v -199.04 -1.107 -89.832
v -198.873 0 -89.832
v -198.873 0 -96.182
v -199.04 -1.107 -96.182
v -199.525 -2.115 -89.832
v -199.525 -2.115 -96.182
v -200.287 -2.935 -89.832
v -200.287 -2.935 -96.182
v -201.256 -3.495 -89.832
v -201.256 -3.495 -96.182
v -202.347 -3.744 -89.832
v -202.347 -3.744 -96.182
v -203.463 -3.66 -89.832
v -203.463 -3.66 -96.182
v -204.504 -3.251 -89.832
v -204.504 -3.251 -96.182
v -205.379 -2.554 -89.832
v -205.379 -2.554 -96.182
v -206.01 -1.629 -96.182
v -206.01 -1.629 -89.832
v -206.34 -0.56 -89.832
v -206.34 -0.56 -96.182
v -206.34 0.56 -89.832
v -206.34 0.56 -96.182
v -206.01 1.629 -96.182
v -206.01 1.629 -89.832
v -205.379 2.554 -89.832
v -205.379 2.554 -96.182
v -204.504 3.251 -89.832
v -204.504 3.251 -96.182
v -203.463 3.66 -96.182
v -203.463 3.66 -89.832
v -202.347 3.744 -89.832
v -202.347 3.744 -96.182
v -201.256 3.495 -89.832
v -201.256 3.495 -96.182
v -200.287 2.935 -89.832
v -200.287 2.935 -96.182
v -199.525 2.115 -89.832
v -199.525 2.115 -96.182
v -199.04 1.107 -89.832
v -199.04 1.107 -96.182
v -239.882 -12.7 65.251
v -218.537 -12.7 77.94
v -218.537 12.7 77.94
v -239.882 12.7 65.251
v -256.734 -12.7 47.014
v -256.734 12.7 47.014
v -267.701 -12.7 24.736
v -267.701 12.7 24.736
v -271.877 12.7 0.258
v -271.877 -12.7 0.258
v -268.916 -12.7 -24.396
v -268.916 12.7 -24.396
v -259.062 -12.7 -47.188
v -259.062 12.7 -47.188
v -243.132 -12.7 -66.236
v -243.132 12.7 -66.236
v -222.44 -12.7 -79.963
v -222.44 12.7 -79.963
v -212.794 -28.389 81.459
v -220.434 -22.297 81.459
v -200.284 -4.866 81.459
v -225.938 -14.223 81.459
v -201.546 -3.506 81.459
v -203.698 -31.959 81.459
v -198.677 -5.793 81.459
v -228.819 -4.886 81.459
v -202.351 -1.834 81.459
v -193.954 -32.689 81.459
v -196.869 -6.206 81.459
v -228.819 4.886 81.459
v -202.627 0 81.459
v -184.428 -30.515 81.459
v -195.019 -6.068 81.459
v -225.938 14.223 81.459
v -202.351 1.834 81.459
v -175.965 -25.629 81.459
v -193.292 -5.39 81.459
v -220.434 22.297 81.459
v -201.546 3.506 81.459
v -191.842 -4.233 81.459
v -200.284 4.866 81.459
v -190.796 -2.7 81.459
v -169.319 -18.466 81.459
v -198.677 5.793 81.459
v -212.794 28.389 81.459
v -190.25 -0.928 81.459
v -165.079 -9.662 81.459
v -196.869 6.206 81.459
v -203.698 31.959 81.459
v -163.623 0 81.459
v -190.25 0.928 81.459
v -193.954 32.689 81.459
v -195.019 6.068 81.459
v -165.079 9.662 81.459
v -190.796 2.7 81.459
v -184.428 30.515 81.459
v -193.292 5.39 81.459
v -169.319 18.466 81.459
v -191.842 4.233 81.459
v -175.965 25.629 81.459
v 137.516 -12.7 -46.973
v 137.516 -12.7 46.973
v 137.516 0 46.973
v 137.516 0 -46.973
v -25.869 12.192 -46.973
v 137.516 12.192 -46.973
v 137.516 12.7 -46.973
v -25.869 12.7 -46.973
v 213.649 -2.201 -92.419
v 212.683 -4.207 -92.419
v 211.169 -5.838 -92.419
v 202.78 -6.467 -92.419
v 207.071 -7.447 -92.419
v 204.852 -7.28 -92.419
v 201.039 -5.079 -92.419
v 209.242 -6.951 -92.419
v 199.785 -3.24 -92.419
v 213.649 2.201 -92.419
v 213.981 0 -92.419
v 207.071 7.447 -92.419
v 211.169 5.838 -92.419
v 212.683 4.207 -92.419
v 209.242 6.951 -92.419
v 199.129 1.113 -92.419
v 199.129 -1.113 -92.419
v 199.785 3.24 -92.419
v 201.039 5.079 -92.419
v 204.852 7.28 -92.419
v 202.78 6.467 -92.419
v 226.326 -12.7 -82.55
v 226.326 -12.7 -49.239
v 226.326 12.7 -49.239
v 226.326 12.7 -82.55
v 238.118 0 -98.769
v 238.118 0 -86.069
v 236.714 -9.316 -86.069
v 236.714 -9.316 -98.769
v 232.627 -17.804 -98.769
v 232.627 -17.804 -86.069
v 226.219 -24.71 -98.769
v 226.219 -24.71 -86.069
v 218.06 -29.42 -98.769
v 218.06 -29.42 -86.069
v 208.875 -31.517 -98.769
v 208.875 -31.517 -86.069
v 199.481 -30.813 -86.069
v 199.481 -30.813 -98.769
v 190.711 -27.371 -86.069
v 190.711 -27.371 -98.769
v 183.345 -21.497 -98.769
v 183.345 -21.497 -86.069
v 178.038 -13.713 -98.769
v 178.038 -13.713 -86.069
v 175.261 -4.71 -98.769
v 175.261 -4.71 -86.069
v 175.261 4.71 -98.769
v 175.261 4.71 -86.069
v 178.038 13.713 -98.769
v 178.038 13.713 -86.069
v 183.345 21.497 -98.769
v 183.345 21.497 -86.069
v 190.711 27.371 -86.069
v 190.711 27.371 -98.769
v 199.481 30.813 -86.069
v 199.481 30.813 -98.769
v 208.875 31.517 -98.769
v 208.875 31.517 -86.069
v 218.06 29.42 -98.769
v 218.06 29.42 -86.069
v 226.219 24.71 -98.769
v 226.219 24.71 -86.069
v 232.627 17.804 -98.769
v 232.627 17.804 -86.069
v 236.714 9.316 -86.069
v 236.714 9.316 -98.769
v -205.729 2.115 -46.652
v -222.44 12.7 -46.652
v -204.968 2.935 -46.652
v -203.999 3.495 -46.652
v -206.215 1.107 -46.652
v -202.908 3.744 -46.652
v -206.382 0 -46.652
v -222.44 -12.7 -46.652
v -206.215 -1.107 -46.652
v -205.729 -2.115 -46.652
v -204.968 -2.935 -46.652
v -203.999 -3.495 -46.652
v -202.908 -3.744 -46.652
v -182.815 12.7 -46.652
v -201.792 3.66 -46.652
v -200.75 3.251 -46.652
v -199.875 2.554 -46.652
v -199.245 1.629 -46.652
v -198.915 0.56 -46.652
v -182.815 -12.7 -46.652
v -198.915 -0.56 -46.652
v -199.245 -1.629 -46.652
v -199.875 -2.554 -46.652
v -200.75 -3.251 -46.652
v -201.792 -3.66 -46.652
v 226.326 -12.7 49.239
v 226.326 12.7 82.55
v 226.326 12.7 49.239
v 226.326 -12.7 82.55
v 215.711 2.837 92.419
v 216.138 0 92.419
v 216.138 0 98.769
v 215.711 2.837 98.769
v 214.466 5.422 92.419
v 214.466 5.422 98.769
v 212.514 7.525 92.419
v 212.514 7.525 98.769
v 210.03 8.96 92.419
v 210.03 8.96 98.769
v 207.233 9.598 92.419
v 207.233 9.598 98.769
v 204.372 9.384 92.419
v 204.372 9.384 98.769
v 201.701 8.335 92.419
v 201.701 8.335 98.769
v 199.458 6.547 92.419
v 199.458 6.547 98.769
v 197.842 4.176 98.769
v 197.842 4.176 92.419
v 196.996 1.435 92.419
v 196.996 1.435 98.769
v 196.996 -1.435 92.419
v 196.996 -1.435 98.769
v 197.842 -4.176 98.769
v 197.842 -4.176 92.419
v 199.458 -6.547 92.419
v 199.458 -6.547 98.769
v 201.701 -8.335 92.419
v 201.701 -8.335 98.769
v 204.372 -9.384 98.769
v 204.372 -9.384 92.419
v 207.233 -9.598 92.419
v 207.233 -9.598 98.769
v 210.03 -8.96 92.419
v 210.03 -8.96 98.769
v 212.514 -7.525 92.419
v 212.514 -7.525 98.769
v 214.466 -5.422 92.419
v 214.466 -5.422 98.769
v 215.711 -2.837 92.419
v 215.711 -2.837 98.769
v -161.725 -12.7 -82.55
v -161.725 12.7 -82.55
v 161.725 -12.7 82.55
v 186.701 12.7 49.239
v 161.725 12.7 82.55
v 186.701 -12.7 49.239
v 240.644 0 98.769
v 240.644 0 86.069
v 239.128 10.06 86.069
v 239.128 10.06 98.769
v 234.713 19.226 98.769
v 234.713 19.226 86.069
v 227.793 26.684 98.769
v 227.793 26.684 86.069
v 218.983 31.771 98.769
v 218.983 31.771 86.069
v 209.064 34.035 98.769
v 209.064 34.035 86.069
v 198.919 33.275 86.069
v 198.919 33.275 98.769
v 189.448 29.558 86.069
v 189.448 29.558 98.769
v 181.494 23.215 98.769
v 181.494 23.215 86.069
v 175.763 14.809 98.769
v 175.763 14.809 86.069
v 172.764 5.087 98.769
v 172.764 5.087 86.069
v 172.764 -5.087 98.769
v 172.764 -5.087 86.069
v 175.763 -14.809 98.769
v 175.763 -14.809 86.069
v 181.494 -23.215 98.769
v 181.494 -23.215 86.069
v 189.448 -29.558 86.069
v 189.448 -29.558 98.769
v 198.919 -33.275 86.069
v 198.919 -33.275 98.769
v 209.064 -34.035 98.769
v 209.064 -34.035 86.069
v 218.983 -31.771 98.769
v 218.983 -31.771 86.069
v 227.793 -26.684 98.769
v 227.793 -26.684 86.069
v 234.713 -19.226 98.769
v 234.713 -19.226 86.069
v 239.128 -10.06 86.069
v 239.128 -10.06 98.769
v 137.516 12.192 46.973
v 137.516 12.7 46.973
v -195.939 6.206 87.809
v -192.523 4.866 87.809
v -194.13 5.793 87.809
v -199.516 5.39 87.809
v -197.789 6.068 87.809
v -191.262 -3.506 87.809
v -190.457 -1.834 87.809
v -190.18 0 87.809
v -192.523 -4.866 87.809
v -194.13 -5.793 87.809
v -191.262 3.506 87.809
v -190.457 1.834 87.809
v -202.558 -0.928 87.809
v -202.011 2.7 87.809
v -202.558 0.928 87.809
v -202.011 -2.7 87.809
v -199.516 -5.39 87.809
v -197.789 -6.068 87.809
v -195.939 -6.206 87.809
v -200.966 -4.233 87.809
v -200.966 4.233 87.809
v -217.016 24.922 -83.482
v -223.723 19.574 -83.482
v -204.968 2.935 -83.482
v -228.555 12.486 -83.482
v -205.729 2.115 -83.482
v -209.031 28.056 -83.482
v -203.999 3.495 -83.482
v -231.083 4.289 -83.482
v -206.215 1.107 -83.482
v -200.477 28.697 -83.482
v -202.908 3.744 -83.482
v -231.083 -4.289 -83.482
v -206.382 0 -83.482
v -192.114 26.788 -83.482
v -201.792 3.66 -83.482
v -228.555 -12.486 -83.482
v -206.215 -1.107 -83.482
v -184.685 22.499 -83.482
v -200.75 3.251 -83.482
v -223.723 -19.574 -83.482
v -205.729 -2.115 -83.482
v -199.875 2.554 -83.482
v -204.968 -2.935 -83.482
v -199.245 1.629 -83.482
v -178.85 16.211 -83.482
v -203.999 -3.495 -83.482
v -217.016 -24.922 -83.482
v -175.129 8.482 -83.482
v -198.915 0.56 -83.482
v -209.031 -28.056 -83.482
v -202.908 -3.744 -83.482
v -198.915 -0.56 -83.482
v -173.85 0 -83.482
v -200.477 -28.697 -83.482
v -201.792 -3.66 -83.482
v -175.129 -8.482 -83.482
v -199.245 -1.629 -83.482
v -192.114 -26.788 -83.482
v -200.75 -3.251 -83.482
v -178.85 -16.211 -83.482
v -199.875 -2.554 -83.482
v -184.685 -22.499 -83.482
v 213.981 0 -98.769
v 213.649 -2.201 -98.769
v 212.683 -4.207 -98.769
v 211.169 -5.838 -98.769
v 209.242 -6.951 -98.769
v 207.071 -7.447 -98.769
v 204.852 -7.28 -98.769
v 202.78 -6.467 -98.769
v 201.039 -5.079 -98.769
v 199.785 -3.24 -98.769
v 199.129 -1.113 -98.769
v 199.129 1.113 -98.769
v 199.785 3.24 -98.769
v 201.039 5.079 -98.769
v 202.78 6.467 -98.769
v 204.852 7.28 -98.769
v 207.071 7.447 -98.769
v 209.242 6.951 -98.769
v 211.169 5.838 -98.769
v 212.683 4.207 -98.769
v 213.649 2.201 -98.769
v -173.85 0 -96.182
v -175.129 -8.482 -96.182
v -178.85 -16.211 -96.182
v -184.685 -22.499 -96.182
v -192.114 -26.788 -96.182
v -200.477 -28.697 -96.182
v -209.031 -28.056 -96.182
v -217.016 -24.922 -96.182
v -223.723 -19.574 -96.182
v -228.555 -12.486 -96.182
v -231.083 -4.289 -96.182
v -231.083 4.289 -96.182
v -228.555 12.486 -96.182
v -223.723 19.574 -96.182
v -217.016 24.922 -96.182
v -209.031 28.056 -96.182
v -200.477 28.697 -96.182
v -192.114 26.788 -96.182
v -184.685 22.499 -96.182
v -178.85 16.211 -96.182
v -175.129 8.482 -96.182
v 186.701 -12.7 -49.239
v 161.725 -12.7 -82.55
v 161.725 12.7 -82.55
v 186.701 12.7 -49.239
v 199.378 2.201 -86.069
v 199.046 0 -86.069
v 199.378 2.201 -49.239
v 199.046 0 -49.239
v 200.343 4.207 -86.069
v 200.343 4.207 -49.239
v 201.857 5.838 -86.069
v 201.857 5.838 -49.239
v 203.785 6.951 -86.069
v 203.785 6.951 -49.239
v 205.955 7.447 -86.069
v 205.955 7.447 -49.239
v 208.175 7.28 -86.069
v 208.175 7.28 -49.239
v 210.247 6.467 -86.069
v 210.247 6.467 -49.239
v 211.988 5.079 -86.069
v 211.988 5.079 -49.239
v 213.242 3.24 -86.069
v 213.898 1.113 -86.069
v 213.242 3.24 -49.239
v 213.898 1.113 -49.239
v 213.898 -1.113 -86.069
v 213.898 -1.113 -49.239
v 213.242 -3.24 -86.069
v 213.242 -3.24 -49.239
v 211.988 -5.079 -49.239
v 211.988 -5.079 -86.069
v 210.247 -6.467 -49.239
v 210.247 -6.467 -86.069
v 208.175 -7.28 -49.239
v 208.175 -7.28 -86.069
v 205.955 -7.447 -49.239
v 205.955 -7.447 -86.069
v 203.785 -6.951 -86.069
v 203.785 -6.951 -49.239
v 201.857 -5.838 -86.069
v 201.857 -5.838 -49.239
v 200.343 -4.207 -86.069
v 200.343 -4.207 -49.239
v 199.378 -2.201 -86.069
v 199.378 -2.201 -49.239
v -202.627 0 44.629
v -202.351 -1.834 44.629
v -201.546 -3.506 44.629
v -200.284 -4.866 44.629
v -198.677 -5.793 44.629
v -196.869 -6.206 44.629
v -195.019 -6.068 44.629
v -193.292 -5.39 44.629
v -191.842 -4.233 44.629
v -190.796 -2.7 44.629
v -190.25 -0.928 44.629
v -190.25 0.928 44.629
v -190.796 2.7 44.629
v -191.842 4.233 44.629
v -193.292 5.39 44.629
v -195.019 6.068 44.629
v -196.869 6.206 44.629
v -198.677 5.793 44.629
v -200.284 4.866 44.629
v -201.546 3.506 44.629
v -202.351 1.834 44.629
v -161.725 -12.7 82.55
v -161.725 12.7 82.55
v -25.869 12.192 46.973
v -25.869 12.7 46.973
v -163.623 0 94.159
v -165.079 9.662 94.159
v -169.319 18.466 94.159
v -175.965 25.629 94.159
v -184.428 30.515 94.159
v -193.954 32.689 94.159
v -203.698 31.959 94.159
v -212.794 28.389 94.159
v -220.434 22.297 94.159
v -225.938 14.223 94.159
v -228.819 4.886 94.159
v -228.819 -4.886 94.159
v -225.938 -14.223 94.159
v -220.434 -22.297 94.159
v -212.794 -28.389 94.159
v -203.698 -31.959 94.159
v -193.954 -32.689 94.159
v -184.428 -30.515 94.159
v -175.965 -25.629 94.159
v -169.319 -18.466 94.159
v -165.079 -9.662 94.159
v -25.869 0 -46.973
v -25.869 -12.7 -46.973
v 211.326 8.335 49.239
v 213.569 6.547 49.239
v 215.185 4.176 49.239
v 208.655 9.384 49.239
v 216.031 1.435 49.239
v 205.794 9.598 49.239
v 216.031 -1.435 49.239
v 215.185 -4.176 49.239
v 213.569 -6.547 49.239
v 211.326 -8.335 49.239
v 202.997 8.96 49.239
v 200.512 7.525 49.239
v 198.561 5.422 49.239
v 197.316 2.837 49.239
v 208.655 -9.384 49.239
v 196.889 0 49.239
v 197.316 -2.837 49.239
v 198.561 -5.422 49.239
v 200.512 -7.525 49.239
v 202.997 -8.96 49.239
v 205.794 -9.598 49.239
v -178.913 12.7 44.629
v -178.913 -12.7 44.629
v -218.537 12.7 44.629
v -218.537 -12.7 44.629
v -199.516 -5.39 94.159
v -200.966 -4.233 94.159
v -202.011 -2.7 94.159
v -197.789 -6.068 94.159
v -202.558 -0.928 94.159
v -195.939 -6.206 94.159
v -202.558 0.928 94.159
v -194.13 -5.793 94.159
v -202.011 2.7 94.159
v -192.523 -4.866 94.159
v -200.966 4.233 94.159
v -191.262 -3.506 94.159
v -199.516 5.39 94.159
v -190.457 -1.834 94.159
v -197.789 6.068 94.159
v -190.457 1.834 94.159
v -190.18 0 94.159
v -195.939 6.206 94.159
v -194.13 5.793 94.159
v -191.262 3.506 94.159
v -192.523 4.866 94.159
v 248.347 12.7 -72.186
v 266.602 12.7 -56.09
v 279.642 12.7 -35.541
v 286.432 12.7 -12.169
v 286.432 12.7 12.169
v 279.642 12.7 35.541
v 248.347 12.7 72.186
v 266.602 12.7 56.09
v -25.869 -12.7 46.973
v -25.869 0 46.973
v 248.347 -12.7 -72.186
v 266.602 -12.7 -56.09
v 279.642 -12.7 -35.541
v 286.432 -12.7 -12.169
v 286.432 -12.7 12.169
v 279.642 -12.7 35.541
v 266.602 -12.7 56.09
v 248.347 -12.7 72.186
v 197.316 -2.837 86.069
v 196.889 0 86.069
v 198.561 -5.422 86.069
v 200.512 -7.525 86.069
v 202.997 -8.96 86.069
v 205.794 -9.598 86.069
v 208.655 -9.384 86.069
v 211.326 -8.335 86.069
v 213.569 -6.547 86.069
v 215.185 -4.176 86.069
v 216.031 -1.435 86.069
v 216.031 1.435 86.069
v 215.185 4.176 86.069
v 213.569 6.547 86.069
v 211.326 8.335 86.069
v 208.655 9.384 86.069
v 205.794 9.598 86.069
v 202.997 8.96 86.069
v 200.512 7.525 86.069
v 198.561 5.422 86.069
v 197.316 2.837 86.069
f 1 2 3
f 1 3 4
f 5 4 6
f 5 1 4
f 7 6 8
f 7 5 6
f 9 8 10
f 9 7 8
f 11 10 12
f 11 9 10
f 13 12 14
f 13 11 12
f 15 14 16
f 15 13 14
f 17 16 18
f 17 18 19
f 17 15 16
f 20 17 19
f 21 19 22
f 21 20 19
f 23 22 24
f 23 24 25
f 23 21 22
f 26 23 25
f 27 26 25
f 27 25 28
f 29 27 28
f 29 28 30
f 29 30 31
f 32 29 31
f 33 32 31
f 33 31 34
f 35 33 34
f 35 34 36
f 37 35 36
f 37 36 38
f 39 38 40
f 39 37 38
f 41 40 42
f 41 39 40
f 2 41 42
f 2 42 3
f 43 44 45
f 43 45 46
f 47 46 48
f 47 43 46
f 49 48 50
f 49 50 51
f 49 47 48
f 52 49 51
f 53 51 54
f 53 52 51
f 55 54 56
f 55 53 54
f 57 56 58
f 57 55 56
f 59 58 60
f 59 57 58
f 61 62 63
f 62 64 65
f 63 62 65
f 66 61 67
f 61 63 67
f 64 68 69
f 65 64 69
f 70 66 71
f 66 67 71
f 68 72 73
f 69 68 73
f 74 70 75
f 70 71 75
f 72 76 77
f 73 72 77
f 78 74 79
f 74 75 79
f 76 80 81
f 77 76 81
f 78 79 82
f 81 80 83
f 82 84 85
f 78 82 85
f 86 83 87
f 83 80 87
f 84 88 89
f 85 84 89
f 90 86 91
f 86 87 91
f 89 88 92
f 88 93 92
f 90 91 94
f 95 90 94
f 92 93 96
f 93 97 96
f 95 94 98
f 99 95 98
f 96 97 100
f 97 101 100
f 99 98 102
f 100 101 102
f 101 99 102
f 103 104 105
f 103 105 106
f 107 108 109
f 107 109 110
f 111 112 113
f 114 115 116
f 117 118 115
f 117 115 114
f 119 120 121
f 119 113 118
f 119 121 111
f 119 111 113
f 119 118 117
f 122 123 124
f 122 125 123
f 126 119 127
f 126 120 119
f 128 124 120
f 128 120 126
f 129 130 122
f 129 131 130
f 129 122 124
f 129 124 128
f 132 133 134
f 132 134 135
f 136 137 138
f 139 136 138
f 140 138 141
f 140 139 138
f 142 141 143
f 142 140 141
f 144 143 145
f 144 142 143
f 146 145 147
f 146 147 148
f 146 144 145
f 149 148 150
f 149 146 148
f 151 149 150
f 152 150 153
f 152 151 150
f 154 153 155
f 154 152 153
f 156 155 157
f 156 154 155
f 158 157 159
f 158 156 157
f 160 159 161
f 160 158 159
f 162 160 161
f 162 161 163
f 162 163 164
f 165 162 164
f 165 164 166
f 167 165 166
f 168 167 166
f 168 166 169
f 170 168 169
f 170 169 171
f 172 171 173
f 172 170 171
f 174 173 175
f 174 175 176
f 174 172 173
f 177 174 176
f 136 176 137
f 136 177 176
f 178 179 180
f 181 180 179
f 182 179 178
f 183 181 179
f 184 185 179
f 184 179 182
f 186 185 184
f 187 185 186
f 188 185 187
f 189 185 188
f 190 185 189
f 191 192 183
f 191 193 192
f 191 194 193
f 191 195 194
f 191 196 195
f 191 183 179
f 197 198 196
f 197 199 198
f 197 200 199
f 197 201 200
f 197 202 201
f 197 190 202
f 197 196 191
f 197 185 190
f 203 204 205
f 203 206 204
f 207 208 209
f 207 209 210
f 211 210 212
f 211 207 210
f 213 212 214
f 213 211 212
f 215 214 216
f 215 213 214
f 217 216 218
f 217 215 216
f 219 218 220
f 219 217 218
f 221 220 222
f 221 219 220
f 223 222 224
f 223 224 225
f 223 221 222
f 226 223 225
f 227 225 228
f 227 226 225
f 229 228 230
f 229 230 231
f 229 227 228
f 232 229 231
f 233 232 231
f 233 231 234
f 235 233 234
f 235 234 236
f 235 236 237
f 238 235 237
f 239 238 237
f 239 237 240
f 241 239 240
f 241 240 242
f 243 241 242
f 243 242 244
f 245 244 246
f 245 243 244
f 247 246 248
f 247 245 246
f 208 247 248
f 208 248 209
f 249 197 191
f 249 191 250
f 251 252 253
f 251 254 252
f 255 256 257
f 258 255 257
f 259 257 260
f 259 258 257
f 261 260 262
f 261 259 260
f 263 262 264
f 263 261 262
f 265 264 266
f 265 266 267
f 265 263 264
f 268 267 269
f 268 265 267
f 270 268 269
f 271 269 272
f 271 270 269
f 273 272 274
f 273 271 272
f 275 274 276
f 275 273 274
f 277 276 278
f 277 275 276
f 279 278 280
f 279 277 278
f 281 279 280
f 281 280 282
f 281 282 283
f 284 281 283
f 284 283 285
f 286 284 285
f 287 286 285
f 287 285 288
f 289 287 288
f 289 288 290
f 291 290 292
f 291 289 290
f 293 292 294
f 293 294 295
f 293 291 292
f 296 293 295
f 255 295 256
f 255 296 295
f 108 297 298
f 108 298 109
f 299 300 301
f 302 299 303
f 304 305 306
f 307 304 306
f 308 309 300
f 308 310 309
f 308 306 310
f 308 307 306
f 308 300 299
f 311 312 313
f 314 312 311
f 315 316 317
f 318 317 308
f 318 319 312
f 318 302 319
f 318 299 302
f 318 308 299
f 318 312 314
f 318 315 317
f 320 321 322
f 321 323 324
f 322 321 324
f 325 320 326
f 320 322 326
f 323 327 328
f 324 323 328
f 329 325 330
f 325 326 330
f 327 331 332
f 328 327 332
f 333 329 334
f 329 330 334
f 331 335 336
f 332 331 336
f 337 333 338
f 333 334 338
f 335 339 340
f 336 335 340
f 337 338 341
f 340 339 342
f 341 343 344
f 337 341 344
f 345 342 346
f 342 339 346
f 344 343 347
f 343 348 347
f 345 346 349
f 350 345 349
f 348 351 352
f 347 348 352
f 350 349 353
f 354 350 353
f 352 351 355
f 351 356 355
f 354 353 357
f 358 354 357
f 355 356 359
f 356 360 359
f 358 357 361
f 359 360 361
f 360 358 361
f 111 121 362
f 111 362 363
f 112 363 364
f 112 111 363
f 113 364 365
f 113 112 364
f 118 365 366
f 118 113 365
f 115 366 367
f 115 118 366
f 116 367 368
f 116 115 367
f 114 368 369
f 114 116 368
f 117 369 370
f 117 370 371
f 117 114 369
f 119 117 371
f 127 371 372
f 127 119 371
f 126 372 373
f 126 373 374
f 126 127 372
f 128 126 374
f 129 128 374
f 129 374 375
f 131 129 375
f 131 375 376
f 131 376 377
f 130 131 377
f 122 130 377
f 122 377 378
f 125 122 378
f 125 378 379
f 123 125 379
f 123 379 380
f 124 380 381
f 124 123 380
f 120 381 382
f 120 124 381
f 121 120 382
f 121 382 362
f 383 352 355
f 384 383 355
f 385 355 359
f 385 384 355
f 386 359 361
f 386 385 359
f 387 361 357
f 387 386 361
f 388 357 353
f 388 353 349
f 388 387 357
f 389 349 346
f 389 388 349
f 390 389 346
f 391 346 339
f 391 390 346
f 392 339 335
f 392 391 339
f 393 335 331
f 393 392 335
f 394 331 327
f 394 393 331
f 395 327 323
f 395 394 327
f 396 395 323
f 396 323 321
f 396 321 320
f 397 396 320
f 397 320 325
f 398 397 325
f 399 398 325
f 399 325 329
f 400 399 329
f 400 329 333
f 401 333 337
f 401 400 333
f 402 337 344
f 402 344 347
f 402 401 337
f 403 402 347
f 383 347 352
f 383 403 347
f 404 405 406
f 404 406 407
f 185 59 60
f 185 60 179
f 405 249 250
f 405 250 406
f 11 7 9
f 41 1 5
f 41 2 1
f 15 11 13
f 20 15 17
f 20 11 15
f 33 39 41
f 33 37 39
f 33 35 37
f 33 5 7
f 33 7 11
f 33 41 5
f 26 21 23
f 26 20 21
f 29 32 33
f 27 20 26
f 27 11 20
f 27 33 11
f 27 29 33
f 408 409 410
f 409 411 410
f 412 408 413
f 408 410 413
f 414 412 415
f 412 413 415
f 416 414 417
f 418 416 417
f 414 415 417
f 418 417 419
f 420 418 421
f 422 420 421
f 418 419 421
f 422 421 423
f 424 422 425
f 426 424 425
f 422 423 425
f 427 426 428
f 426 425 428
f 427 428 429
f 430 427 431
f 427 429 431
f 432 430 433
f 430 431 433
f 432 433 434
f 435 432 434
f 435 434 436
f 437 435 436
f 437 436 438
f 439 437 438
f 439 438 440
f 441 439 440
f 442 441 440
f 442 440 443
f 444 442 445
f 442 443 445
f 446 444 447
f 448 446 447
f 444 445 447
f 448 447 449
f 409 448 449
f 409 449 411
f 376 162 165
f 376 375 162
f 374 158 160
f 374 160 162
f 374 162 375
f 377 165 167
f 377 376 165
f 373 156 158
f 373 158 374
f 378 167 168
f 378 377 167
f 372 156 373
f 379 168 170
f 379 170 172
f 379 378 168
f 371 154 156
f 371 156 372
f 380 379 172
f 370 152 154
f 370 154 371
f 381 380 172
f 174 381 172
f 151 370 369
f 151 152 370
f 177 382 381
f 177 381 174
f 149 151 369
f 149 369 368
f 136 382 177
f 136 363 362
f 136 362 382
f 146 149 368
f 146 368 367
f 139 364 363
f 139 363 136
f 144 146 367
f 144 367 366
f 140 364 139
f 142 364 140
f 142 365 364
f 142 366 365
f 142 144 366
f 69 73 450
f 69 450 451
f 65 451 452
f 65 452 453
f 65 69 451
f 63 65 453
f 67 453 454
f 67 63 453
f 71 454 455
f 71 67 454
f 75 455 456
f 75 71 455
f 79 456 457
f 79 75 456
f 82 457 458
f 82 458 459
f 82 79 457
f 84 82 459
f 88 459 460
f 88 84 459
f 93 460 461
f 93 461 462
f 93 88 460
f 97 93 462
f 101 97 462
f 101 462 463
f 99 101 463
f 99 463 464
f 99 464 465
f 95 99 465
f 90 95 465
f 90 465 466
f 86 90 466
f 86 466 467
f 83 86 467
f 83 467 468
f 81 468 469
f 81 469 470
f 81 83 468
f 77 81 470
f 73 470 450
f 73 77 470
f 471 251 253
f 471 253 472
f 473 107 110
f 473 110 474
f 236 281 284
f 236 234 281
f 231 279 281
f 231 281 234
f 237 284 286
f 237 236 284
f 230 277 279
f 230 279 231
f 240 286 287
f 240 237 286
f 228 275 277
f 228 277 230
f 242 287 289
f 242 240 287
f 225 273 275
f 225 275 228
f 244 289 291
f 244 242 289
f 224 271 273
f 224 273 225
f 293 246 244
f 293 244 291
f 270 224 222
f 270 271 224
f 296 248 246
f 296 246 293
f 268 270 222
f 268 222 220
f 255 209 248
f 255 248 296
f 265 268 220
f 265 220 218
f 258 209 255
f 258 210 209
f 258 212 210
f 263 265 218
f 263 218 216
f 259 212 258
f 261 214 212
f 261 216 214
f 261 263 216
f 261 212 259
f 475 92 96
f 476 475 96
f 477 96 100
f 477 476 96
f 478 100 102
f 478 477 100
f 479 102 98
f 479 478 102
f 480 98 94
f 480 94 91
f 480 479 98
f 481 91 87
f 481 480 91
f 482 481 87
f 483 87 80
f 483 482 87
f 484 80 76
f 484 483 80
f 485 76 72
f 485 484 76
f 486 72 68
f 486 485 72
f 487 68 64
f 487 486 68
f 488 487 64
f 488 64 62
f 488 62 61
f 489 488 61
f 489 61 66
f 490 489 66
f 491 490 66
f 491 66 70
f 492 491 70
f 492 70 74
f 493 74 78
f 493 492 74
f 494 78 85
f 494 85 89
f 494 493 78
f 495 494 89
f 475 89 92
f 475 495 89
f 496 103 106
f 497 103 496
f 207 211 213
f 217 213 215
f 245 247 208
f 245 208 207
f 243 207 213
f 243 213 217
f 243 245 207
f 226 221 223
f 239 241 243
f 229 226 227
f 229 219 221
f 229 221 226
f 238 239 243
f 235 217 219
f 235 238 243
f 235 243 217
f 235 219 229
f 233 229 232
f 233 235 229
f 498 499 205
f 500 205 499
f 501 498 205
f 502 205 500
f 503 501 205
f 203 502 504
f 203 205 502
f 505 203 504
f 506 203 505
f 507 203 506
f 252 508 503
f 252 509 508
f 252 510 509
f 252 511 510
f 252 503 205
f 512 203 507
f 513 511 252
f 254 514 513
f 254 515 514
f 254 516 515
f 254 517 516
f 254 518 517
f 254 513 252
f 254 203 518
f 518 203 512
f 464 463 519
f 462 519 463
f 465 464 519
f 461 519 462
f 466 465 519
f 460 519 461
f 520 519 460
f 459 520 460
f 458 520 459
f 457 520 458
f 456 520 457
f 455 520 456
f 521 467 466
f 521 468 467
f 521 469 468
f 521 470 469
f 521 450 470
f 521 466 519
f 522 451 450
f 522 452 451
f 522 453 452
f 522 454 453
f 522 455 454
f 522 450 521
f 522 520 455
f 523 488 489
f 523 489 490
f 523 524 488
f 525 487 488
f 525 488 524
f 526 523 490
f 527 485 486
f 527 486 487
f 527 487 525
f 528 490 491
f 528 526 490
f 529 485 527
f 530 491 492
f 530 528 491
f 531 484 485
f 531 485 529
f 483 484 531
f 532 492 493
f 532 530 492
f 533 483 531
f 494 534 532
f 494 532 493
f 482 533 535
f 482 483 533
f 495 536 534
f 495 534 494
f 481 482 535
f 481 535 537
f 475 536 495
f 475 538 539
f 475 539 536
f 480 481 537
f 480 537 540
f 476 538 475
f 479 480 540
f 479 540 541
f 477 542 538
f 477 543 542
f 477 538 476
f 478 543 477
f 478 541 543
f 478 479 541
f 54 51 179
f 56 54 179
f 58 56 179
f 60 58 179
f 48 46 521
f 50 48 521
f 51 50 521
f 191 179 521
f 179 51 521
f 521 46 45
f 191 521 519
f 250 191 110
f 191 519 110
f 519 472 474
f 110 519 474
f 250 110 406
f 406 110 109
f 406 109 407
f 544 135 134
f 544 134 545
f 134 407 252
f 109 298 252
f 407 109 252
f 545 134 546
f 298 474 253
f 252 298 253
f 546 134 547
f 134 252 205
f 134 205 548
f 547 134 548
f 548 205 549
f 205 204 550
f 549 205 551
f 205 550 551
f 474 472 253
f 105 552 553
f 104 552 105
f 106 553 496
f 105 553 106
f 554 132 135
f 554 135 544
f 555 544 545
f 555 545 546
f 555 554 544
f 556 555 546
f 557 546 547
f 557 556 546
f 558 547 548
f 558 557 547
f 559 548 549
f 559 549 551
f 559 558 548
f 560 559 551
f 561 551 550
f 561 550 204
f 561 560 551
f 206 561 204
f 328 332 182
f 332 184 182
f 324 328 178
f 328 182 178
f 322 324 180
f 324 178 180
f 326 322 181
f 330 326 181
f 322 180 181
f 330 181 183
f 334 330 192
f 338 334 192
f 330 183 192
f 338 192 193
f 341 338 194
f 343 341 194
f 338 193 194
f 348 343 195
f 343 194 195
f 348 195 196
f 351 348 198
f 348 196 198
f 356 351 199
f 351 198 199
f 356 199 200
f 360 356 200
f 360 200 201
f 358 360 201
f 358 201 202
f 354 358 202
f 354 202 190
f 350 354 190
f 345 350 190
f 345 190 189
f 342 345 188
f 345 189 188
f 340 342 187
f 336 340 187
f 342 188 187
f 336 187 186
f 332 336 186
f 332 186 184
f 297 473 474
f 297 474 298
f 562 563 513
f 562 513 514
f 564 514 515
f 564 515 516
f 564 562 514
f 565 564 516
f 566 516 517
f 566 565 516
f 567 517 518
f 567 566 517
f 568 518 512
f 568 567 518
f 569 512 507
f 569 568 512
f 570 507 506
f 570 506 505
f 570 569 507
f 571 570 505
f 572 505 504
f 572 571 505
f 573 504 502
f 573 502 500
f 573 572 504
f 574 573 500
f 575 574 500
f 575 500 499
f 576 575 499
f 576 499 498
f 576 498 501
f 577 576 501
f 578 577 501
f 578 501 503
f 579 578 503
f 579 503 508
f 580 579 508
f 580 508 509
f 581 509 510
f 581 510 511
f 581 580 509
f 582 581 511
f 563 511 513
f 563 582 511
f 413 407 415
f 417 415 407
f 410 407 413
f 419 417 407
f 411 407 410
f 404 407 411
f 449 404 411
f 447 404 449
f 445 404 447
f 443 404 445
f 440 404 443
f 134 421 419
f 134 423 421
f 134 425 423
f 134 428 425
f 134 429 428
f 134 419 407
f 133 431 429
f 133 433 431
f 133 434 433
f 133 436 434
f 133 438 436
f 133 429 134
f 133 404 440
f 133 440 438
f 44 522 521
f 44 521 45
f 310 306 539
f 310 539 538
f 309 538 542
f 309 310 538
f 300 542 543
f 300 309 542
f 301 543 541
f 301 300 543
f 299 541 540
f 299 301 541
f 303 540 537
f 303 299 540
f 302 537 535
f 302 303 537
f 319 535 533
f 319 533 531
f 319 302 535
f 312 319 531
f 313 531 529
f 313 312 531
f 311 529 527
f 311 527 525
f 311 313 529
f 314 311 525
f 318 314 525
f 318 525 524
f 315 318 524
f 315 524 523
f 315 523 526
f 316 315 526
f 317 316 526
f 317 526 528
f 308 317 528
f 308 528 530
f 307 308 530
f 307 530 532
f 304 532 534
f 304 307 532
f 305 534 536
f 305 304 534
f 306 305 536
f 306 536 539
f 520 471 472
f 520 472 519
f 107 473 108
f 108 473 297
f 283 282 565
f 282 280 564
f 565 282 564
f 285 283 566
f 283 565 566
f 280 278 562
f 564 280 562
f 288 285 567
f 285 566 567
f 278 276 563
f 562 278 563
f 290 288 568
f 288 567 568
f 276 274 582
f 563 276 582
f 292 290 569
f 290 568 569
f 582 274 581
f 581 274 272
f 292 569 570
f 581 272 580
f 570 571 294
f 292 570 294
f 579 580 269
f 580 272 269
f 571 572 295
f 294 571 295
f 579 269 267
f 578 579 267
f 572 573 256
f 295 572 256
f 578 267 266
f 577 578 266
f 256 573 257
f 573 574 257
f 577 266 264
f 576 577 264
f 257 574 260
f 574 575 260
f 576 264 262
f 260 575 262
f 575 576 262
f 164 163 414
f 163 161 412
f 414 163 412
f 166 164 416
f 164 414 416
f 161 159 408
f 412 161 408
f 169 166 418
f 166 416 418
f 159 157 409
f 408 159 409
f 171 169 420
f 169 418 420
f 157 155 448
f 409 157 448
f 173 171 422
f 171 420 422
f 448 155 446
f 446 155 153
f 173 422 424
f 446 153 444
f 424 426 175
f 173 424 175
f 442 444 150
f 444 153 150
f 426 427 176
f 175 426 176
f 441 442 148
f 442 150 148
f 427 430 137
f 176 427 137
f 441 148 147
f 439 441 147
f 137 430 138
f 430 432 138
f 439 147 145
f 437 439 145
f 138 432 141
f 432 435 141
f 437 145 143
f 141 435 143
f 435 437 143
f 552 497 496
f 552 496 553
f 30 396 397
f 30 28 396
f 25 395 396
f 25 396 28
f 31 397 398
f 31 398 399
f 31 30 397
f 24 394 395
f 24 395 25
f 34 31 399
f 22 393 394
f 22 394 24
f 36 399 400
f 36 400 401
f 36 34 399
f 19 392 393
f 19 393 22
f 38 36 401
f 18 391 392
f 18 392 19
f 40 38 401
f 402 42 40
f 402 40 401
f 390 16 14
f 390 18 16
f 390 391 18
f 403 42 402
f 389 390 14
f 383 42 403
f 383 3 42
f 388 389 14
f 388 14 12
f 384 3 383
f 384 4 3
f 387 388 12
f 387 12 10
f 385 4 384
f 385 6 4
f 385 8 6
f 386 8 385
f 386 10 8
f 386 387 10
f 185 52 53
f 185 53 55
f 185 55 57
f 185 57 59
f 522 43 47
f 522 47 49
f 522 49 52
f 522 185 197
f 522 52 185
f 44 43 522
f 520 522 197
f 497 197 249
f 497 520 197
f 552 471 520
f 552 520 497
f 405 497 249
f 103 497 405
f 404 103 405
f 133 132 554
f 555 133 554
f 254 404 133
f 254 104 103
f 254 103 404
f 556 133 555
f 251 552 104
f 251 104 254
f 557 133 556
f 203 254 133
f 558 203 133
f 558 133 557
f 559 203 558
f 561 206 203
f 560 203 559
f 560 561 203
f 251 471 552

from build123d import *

# Parameters (mm, degrees)
F1_DEPTH  = 12.7
F0_W      = 163.3856055679
F0_H      = 27.0547205253
F0_H_2    = 34.7771560773
F0_H_3    = 32.1148465989
F2_DEPTH  = 12.192
F0_W_2    = 6.2235964999
F0_H_4    = 43.18
F0_W_3    = 3.7542508378
F0_W_4    = 9.6248776398
F0_W_5    = 7.4676067315
F7_R      = 32.7809954098
F7_R_2    = 6.2235964999
F8_DEPTH  = 6.35
F9_R      = 34.1304188129
F9_R_2    = 9.6248776398
F10_DEPTH = 6.35
F11_R     = 31.6050614304
F11_R_2   = 7.4676067315
F12_DEPTH = 6.35
F13_R     = 28.7772808224
F13_R_2   = 3.7542508378
F14_DEPTH = 6.35


with BuildPart() as f1:
    # F0 (on Front) → F1 (new body, symmetric)
    with BuildSketch(Plane.XZ):
        with BuildLine():
            Line((186.7009509993, 49.238986743), (161.7247212493, 82.55))
            Line((161.7247212493, 82.55), (-161.7247212493, 82.55))
            Line((-161.7247212493, 82.55), (-178.912508309, 44.6288234264))
            Line((-178.912508309, 44.6288234264), (-196.4037567377, 44.6288234264))
            Line((-196.4037567377, 44.6288234264), (-202.6273532376, 44.6288234264))
            Line((-202.6273532376, 44.6288234264), (-218.5374638219, 44.6288234264))
            Line((-218.5374638219, 44.6288234264), (-218.5374638219, 77.9398366834))
            ThreePointArc((-218.5374638219, 77.9398366834), (-271.8769801908, 0.258229293), (-222.4398309941, -79.9633663813))
            Line((-222.4398309941, -79.9633663813), (-222.4398309941, -46.6523531243))
            Line((-222.4398309941, -46.6523531243), (-206.3816040754, -46.6523531243))
            Line((-206.3816040754, -46.6523531243), (-202.6273532376, -46.6523531243))
            Line((-202.6273532376, -46.6523531243), (-182.8148754811, -46.6523531243))
            Line((-182.8148754811, -46.6523531243), (-161.7247212493, -82.55))
            Line((-161.7247212493, -82.55), (161.7247212493, -82.55))
            Line((161.7247212493, -82.55), (186.7009509993, -49.238986743))
            Line((186.7009509993, -49.238986743), (199.0458220243, -49.238986743))
            Line((199.0458220243, -49.238986743), (206.5134287558, -49.238986743))
            Line((206.5134287558, -49.238986743), (226.3259065123, -49.238986743))
            Line((226.3259065123, -49.238986743), (226.3259065123, -82.55))
            ThreePointArc((226.3259065123, -82.55), (287.2935352333, 0), (226.3259065123, 82.55))
            Line((226.3259065123, 82.55), (226.3259065123, 49.238986743))
            Line((226.3259065123, 49.238986743), (206.5134287558, 49.238986743))
            Line((206.5134287558, 49.238986743), (196.888551116, 49.238986743))
            Line((196.888551116, 49.238986743), (186.7009509993, 49.238986743))
        make_face()
        Polygon((137.5162151193, -14.8585150018), (137.5162151193, -46.9733616008), (-25.8693904485, -46.9733616008), (-25.8693904485, -14.8585150018), (-25.8693904485, 19.9186410755), (-25.8693904485, 46.9733616008), (137.5162151193, 46.9733616008), (137.5162151193, 19.9186410755), align=None, mode=Mode.SUBTRACT)
    extrude(amount=F1_DEPTH, both=True)

    # F0 (on Front) → F2 (join)
    with BuildSketch(Plane.XZ):
        with Locations((55.8234123354, 33.4460013381)):
            Rectangle(F0_W, F0_H)
        with Locations((55.8234123354, 2.5300630368)):
            Rectangle(F0_W, F0_H_2)
        with Locations((55.8234123354, -30.9159383013)):
            Rectangle(F0_W, F0_H_3)
    extrude(amount=-F2_DEPTH)

    # F0 (on Front) → F3 (revolve)
    with BuildSketch(Plane.XZ):
        with Locations((-199.5155549877, 66.2188234264)):
            Rectangle(F0_W_2, F0_H_4)
    revolve(axis=Axis((-196.4037567377, 0, 66.2188234264), (0, 0, 1)))

    # F0 (on Front) → F4 (revolve)
    with BuildSketch(Plane.XZ):
        with Locations((-204.5044786565, -68.2423531243)):
            Rectangle(F0_W_3, F0_H_4)
    revolve(axis=Axis((-202.6273532376, 0, -68.2423531243), (0, 0, -1)))

    # F0 (on Front) → F5 (revolve)
    with BuildSketch(Plane.XZ):
        with Locations((201.7009899359, 70.828986743)):
            Rectangle(F0_W_4, F0_H_4)
    revolve(axis=Axis((206.5134287558, 0, 70.828986743), (0, 0, 1)))

    # F0 (on Front) → F6 (revolve)
    with BuildSketch(Plane.XZ):
        with Locations((202.7796253901, -70.828986743)):
            Rectangle(F0_W_5, F0_H_4)
    revolve(axis=Axis((206.5134287558, 0, -70.828986743), (0, 0, -1)))

    # F7 (on face) → F8 (join, symmetric)
    with BuildSketch(Plane.XY.offset(87.8088234264)):
        with Locations((-196.4037567377, 0)):
            Circle(F7_R)
        with Locations((-196.4037567377, 0)):
            Circle(F7_R_2, mode=Mode.SUBTRACT)
    extrude(amount=F8_DEPTH, both=True)

    # F9 (on face) → F10 (join, symmetric)
    with BuildSketch(Plane.XY.offset(92.418986743)):
        with Locations((206.5134287558, 0)):
            Circle(F9_R)
        with Locations((206.5134287558, 0)):
            Circle(F9_R_2, mode=Mode.SUBTRACT)
    extrude(amount=F10_DEPTH, both=True)

    # F11 (on face) → F12 (join, symmetric)
    with BuildSketch(Plane(origin=(0, 0, -92.418986743), x_dir=(1, 0, 0), z_dir=(0, 0, -1))):
        with Locations((206.5134287558, 0)):
            Circle(F11_R)
        with Locations((206.5134287558, 0)):
            Circle(F11_R_2, mode=Mode.SUBTRACT)
    extrude(amount=F12_DEPTH, both=True)

    # F13 (on face) → F14 (join, symmetric)
    with BuildSketch(Plane(origin=(0, 0, -89.8323531243), x_dir=(1, 0, 0), z_dir=(0, 0, -1))):
        with Locations((-202.6273532376, 0)):
            Circle(F13_R)
        with Locations((-202.6273532376, 0)):
            Circle(F13_R_2, mode=Mode.SUBTRACT)
    extrude(amount=F14_DEPTH, both=True)


solid = f1.part
